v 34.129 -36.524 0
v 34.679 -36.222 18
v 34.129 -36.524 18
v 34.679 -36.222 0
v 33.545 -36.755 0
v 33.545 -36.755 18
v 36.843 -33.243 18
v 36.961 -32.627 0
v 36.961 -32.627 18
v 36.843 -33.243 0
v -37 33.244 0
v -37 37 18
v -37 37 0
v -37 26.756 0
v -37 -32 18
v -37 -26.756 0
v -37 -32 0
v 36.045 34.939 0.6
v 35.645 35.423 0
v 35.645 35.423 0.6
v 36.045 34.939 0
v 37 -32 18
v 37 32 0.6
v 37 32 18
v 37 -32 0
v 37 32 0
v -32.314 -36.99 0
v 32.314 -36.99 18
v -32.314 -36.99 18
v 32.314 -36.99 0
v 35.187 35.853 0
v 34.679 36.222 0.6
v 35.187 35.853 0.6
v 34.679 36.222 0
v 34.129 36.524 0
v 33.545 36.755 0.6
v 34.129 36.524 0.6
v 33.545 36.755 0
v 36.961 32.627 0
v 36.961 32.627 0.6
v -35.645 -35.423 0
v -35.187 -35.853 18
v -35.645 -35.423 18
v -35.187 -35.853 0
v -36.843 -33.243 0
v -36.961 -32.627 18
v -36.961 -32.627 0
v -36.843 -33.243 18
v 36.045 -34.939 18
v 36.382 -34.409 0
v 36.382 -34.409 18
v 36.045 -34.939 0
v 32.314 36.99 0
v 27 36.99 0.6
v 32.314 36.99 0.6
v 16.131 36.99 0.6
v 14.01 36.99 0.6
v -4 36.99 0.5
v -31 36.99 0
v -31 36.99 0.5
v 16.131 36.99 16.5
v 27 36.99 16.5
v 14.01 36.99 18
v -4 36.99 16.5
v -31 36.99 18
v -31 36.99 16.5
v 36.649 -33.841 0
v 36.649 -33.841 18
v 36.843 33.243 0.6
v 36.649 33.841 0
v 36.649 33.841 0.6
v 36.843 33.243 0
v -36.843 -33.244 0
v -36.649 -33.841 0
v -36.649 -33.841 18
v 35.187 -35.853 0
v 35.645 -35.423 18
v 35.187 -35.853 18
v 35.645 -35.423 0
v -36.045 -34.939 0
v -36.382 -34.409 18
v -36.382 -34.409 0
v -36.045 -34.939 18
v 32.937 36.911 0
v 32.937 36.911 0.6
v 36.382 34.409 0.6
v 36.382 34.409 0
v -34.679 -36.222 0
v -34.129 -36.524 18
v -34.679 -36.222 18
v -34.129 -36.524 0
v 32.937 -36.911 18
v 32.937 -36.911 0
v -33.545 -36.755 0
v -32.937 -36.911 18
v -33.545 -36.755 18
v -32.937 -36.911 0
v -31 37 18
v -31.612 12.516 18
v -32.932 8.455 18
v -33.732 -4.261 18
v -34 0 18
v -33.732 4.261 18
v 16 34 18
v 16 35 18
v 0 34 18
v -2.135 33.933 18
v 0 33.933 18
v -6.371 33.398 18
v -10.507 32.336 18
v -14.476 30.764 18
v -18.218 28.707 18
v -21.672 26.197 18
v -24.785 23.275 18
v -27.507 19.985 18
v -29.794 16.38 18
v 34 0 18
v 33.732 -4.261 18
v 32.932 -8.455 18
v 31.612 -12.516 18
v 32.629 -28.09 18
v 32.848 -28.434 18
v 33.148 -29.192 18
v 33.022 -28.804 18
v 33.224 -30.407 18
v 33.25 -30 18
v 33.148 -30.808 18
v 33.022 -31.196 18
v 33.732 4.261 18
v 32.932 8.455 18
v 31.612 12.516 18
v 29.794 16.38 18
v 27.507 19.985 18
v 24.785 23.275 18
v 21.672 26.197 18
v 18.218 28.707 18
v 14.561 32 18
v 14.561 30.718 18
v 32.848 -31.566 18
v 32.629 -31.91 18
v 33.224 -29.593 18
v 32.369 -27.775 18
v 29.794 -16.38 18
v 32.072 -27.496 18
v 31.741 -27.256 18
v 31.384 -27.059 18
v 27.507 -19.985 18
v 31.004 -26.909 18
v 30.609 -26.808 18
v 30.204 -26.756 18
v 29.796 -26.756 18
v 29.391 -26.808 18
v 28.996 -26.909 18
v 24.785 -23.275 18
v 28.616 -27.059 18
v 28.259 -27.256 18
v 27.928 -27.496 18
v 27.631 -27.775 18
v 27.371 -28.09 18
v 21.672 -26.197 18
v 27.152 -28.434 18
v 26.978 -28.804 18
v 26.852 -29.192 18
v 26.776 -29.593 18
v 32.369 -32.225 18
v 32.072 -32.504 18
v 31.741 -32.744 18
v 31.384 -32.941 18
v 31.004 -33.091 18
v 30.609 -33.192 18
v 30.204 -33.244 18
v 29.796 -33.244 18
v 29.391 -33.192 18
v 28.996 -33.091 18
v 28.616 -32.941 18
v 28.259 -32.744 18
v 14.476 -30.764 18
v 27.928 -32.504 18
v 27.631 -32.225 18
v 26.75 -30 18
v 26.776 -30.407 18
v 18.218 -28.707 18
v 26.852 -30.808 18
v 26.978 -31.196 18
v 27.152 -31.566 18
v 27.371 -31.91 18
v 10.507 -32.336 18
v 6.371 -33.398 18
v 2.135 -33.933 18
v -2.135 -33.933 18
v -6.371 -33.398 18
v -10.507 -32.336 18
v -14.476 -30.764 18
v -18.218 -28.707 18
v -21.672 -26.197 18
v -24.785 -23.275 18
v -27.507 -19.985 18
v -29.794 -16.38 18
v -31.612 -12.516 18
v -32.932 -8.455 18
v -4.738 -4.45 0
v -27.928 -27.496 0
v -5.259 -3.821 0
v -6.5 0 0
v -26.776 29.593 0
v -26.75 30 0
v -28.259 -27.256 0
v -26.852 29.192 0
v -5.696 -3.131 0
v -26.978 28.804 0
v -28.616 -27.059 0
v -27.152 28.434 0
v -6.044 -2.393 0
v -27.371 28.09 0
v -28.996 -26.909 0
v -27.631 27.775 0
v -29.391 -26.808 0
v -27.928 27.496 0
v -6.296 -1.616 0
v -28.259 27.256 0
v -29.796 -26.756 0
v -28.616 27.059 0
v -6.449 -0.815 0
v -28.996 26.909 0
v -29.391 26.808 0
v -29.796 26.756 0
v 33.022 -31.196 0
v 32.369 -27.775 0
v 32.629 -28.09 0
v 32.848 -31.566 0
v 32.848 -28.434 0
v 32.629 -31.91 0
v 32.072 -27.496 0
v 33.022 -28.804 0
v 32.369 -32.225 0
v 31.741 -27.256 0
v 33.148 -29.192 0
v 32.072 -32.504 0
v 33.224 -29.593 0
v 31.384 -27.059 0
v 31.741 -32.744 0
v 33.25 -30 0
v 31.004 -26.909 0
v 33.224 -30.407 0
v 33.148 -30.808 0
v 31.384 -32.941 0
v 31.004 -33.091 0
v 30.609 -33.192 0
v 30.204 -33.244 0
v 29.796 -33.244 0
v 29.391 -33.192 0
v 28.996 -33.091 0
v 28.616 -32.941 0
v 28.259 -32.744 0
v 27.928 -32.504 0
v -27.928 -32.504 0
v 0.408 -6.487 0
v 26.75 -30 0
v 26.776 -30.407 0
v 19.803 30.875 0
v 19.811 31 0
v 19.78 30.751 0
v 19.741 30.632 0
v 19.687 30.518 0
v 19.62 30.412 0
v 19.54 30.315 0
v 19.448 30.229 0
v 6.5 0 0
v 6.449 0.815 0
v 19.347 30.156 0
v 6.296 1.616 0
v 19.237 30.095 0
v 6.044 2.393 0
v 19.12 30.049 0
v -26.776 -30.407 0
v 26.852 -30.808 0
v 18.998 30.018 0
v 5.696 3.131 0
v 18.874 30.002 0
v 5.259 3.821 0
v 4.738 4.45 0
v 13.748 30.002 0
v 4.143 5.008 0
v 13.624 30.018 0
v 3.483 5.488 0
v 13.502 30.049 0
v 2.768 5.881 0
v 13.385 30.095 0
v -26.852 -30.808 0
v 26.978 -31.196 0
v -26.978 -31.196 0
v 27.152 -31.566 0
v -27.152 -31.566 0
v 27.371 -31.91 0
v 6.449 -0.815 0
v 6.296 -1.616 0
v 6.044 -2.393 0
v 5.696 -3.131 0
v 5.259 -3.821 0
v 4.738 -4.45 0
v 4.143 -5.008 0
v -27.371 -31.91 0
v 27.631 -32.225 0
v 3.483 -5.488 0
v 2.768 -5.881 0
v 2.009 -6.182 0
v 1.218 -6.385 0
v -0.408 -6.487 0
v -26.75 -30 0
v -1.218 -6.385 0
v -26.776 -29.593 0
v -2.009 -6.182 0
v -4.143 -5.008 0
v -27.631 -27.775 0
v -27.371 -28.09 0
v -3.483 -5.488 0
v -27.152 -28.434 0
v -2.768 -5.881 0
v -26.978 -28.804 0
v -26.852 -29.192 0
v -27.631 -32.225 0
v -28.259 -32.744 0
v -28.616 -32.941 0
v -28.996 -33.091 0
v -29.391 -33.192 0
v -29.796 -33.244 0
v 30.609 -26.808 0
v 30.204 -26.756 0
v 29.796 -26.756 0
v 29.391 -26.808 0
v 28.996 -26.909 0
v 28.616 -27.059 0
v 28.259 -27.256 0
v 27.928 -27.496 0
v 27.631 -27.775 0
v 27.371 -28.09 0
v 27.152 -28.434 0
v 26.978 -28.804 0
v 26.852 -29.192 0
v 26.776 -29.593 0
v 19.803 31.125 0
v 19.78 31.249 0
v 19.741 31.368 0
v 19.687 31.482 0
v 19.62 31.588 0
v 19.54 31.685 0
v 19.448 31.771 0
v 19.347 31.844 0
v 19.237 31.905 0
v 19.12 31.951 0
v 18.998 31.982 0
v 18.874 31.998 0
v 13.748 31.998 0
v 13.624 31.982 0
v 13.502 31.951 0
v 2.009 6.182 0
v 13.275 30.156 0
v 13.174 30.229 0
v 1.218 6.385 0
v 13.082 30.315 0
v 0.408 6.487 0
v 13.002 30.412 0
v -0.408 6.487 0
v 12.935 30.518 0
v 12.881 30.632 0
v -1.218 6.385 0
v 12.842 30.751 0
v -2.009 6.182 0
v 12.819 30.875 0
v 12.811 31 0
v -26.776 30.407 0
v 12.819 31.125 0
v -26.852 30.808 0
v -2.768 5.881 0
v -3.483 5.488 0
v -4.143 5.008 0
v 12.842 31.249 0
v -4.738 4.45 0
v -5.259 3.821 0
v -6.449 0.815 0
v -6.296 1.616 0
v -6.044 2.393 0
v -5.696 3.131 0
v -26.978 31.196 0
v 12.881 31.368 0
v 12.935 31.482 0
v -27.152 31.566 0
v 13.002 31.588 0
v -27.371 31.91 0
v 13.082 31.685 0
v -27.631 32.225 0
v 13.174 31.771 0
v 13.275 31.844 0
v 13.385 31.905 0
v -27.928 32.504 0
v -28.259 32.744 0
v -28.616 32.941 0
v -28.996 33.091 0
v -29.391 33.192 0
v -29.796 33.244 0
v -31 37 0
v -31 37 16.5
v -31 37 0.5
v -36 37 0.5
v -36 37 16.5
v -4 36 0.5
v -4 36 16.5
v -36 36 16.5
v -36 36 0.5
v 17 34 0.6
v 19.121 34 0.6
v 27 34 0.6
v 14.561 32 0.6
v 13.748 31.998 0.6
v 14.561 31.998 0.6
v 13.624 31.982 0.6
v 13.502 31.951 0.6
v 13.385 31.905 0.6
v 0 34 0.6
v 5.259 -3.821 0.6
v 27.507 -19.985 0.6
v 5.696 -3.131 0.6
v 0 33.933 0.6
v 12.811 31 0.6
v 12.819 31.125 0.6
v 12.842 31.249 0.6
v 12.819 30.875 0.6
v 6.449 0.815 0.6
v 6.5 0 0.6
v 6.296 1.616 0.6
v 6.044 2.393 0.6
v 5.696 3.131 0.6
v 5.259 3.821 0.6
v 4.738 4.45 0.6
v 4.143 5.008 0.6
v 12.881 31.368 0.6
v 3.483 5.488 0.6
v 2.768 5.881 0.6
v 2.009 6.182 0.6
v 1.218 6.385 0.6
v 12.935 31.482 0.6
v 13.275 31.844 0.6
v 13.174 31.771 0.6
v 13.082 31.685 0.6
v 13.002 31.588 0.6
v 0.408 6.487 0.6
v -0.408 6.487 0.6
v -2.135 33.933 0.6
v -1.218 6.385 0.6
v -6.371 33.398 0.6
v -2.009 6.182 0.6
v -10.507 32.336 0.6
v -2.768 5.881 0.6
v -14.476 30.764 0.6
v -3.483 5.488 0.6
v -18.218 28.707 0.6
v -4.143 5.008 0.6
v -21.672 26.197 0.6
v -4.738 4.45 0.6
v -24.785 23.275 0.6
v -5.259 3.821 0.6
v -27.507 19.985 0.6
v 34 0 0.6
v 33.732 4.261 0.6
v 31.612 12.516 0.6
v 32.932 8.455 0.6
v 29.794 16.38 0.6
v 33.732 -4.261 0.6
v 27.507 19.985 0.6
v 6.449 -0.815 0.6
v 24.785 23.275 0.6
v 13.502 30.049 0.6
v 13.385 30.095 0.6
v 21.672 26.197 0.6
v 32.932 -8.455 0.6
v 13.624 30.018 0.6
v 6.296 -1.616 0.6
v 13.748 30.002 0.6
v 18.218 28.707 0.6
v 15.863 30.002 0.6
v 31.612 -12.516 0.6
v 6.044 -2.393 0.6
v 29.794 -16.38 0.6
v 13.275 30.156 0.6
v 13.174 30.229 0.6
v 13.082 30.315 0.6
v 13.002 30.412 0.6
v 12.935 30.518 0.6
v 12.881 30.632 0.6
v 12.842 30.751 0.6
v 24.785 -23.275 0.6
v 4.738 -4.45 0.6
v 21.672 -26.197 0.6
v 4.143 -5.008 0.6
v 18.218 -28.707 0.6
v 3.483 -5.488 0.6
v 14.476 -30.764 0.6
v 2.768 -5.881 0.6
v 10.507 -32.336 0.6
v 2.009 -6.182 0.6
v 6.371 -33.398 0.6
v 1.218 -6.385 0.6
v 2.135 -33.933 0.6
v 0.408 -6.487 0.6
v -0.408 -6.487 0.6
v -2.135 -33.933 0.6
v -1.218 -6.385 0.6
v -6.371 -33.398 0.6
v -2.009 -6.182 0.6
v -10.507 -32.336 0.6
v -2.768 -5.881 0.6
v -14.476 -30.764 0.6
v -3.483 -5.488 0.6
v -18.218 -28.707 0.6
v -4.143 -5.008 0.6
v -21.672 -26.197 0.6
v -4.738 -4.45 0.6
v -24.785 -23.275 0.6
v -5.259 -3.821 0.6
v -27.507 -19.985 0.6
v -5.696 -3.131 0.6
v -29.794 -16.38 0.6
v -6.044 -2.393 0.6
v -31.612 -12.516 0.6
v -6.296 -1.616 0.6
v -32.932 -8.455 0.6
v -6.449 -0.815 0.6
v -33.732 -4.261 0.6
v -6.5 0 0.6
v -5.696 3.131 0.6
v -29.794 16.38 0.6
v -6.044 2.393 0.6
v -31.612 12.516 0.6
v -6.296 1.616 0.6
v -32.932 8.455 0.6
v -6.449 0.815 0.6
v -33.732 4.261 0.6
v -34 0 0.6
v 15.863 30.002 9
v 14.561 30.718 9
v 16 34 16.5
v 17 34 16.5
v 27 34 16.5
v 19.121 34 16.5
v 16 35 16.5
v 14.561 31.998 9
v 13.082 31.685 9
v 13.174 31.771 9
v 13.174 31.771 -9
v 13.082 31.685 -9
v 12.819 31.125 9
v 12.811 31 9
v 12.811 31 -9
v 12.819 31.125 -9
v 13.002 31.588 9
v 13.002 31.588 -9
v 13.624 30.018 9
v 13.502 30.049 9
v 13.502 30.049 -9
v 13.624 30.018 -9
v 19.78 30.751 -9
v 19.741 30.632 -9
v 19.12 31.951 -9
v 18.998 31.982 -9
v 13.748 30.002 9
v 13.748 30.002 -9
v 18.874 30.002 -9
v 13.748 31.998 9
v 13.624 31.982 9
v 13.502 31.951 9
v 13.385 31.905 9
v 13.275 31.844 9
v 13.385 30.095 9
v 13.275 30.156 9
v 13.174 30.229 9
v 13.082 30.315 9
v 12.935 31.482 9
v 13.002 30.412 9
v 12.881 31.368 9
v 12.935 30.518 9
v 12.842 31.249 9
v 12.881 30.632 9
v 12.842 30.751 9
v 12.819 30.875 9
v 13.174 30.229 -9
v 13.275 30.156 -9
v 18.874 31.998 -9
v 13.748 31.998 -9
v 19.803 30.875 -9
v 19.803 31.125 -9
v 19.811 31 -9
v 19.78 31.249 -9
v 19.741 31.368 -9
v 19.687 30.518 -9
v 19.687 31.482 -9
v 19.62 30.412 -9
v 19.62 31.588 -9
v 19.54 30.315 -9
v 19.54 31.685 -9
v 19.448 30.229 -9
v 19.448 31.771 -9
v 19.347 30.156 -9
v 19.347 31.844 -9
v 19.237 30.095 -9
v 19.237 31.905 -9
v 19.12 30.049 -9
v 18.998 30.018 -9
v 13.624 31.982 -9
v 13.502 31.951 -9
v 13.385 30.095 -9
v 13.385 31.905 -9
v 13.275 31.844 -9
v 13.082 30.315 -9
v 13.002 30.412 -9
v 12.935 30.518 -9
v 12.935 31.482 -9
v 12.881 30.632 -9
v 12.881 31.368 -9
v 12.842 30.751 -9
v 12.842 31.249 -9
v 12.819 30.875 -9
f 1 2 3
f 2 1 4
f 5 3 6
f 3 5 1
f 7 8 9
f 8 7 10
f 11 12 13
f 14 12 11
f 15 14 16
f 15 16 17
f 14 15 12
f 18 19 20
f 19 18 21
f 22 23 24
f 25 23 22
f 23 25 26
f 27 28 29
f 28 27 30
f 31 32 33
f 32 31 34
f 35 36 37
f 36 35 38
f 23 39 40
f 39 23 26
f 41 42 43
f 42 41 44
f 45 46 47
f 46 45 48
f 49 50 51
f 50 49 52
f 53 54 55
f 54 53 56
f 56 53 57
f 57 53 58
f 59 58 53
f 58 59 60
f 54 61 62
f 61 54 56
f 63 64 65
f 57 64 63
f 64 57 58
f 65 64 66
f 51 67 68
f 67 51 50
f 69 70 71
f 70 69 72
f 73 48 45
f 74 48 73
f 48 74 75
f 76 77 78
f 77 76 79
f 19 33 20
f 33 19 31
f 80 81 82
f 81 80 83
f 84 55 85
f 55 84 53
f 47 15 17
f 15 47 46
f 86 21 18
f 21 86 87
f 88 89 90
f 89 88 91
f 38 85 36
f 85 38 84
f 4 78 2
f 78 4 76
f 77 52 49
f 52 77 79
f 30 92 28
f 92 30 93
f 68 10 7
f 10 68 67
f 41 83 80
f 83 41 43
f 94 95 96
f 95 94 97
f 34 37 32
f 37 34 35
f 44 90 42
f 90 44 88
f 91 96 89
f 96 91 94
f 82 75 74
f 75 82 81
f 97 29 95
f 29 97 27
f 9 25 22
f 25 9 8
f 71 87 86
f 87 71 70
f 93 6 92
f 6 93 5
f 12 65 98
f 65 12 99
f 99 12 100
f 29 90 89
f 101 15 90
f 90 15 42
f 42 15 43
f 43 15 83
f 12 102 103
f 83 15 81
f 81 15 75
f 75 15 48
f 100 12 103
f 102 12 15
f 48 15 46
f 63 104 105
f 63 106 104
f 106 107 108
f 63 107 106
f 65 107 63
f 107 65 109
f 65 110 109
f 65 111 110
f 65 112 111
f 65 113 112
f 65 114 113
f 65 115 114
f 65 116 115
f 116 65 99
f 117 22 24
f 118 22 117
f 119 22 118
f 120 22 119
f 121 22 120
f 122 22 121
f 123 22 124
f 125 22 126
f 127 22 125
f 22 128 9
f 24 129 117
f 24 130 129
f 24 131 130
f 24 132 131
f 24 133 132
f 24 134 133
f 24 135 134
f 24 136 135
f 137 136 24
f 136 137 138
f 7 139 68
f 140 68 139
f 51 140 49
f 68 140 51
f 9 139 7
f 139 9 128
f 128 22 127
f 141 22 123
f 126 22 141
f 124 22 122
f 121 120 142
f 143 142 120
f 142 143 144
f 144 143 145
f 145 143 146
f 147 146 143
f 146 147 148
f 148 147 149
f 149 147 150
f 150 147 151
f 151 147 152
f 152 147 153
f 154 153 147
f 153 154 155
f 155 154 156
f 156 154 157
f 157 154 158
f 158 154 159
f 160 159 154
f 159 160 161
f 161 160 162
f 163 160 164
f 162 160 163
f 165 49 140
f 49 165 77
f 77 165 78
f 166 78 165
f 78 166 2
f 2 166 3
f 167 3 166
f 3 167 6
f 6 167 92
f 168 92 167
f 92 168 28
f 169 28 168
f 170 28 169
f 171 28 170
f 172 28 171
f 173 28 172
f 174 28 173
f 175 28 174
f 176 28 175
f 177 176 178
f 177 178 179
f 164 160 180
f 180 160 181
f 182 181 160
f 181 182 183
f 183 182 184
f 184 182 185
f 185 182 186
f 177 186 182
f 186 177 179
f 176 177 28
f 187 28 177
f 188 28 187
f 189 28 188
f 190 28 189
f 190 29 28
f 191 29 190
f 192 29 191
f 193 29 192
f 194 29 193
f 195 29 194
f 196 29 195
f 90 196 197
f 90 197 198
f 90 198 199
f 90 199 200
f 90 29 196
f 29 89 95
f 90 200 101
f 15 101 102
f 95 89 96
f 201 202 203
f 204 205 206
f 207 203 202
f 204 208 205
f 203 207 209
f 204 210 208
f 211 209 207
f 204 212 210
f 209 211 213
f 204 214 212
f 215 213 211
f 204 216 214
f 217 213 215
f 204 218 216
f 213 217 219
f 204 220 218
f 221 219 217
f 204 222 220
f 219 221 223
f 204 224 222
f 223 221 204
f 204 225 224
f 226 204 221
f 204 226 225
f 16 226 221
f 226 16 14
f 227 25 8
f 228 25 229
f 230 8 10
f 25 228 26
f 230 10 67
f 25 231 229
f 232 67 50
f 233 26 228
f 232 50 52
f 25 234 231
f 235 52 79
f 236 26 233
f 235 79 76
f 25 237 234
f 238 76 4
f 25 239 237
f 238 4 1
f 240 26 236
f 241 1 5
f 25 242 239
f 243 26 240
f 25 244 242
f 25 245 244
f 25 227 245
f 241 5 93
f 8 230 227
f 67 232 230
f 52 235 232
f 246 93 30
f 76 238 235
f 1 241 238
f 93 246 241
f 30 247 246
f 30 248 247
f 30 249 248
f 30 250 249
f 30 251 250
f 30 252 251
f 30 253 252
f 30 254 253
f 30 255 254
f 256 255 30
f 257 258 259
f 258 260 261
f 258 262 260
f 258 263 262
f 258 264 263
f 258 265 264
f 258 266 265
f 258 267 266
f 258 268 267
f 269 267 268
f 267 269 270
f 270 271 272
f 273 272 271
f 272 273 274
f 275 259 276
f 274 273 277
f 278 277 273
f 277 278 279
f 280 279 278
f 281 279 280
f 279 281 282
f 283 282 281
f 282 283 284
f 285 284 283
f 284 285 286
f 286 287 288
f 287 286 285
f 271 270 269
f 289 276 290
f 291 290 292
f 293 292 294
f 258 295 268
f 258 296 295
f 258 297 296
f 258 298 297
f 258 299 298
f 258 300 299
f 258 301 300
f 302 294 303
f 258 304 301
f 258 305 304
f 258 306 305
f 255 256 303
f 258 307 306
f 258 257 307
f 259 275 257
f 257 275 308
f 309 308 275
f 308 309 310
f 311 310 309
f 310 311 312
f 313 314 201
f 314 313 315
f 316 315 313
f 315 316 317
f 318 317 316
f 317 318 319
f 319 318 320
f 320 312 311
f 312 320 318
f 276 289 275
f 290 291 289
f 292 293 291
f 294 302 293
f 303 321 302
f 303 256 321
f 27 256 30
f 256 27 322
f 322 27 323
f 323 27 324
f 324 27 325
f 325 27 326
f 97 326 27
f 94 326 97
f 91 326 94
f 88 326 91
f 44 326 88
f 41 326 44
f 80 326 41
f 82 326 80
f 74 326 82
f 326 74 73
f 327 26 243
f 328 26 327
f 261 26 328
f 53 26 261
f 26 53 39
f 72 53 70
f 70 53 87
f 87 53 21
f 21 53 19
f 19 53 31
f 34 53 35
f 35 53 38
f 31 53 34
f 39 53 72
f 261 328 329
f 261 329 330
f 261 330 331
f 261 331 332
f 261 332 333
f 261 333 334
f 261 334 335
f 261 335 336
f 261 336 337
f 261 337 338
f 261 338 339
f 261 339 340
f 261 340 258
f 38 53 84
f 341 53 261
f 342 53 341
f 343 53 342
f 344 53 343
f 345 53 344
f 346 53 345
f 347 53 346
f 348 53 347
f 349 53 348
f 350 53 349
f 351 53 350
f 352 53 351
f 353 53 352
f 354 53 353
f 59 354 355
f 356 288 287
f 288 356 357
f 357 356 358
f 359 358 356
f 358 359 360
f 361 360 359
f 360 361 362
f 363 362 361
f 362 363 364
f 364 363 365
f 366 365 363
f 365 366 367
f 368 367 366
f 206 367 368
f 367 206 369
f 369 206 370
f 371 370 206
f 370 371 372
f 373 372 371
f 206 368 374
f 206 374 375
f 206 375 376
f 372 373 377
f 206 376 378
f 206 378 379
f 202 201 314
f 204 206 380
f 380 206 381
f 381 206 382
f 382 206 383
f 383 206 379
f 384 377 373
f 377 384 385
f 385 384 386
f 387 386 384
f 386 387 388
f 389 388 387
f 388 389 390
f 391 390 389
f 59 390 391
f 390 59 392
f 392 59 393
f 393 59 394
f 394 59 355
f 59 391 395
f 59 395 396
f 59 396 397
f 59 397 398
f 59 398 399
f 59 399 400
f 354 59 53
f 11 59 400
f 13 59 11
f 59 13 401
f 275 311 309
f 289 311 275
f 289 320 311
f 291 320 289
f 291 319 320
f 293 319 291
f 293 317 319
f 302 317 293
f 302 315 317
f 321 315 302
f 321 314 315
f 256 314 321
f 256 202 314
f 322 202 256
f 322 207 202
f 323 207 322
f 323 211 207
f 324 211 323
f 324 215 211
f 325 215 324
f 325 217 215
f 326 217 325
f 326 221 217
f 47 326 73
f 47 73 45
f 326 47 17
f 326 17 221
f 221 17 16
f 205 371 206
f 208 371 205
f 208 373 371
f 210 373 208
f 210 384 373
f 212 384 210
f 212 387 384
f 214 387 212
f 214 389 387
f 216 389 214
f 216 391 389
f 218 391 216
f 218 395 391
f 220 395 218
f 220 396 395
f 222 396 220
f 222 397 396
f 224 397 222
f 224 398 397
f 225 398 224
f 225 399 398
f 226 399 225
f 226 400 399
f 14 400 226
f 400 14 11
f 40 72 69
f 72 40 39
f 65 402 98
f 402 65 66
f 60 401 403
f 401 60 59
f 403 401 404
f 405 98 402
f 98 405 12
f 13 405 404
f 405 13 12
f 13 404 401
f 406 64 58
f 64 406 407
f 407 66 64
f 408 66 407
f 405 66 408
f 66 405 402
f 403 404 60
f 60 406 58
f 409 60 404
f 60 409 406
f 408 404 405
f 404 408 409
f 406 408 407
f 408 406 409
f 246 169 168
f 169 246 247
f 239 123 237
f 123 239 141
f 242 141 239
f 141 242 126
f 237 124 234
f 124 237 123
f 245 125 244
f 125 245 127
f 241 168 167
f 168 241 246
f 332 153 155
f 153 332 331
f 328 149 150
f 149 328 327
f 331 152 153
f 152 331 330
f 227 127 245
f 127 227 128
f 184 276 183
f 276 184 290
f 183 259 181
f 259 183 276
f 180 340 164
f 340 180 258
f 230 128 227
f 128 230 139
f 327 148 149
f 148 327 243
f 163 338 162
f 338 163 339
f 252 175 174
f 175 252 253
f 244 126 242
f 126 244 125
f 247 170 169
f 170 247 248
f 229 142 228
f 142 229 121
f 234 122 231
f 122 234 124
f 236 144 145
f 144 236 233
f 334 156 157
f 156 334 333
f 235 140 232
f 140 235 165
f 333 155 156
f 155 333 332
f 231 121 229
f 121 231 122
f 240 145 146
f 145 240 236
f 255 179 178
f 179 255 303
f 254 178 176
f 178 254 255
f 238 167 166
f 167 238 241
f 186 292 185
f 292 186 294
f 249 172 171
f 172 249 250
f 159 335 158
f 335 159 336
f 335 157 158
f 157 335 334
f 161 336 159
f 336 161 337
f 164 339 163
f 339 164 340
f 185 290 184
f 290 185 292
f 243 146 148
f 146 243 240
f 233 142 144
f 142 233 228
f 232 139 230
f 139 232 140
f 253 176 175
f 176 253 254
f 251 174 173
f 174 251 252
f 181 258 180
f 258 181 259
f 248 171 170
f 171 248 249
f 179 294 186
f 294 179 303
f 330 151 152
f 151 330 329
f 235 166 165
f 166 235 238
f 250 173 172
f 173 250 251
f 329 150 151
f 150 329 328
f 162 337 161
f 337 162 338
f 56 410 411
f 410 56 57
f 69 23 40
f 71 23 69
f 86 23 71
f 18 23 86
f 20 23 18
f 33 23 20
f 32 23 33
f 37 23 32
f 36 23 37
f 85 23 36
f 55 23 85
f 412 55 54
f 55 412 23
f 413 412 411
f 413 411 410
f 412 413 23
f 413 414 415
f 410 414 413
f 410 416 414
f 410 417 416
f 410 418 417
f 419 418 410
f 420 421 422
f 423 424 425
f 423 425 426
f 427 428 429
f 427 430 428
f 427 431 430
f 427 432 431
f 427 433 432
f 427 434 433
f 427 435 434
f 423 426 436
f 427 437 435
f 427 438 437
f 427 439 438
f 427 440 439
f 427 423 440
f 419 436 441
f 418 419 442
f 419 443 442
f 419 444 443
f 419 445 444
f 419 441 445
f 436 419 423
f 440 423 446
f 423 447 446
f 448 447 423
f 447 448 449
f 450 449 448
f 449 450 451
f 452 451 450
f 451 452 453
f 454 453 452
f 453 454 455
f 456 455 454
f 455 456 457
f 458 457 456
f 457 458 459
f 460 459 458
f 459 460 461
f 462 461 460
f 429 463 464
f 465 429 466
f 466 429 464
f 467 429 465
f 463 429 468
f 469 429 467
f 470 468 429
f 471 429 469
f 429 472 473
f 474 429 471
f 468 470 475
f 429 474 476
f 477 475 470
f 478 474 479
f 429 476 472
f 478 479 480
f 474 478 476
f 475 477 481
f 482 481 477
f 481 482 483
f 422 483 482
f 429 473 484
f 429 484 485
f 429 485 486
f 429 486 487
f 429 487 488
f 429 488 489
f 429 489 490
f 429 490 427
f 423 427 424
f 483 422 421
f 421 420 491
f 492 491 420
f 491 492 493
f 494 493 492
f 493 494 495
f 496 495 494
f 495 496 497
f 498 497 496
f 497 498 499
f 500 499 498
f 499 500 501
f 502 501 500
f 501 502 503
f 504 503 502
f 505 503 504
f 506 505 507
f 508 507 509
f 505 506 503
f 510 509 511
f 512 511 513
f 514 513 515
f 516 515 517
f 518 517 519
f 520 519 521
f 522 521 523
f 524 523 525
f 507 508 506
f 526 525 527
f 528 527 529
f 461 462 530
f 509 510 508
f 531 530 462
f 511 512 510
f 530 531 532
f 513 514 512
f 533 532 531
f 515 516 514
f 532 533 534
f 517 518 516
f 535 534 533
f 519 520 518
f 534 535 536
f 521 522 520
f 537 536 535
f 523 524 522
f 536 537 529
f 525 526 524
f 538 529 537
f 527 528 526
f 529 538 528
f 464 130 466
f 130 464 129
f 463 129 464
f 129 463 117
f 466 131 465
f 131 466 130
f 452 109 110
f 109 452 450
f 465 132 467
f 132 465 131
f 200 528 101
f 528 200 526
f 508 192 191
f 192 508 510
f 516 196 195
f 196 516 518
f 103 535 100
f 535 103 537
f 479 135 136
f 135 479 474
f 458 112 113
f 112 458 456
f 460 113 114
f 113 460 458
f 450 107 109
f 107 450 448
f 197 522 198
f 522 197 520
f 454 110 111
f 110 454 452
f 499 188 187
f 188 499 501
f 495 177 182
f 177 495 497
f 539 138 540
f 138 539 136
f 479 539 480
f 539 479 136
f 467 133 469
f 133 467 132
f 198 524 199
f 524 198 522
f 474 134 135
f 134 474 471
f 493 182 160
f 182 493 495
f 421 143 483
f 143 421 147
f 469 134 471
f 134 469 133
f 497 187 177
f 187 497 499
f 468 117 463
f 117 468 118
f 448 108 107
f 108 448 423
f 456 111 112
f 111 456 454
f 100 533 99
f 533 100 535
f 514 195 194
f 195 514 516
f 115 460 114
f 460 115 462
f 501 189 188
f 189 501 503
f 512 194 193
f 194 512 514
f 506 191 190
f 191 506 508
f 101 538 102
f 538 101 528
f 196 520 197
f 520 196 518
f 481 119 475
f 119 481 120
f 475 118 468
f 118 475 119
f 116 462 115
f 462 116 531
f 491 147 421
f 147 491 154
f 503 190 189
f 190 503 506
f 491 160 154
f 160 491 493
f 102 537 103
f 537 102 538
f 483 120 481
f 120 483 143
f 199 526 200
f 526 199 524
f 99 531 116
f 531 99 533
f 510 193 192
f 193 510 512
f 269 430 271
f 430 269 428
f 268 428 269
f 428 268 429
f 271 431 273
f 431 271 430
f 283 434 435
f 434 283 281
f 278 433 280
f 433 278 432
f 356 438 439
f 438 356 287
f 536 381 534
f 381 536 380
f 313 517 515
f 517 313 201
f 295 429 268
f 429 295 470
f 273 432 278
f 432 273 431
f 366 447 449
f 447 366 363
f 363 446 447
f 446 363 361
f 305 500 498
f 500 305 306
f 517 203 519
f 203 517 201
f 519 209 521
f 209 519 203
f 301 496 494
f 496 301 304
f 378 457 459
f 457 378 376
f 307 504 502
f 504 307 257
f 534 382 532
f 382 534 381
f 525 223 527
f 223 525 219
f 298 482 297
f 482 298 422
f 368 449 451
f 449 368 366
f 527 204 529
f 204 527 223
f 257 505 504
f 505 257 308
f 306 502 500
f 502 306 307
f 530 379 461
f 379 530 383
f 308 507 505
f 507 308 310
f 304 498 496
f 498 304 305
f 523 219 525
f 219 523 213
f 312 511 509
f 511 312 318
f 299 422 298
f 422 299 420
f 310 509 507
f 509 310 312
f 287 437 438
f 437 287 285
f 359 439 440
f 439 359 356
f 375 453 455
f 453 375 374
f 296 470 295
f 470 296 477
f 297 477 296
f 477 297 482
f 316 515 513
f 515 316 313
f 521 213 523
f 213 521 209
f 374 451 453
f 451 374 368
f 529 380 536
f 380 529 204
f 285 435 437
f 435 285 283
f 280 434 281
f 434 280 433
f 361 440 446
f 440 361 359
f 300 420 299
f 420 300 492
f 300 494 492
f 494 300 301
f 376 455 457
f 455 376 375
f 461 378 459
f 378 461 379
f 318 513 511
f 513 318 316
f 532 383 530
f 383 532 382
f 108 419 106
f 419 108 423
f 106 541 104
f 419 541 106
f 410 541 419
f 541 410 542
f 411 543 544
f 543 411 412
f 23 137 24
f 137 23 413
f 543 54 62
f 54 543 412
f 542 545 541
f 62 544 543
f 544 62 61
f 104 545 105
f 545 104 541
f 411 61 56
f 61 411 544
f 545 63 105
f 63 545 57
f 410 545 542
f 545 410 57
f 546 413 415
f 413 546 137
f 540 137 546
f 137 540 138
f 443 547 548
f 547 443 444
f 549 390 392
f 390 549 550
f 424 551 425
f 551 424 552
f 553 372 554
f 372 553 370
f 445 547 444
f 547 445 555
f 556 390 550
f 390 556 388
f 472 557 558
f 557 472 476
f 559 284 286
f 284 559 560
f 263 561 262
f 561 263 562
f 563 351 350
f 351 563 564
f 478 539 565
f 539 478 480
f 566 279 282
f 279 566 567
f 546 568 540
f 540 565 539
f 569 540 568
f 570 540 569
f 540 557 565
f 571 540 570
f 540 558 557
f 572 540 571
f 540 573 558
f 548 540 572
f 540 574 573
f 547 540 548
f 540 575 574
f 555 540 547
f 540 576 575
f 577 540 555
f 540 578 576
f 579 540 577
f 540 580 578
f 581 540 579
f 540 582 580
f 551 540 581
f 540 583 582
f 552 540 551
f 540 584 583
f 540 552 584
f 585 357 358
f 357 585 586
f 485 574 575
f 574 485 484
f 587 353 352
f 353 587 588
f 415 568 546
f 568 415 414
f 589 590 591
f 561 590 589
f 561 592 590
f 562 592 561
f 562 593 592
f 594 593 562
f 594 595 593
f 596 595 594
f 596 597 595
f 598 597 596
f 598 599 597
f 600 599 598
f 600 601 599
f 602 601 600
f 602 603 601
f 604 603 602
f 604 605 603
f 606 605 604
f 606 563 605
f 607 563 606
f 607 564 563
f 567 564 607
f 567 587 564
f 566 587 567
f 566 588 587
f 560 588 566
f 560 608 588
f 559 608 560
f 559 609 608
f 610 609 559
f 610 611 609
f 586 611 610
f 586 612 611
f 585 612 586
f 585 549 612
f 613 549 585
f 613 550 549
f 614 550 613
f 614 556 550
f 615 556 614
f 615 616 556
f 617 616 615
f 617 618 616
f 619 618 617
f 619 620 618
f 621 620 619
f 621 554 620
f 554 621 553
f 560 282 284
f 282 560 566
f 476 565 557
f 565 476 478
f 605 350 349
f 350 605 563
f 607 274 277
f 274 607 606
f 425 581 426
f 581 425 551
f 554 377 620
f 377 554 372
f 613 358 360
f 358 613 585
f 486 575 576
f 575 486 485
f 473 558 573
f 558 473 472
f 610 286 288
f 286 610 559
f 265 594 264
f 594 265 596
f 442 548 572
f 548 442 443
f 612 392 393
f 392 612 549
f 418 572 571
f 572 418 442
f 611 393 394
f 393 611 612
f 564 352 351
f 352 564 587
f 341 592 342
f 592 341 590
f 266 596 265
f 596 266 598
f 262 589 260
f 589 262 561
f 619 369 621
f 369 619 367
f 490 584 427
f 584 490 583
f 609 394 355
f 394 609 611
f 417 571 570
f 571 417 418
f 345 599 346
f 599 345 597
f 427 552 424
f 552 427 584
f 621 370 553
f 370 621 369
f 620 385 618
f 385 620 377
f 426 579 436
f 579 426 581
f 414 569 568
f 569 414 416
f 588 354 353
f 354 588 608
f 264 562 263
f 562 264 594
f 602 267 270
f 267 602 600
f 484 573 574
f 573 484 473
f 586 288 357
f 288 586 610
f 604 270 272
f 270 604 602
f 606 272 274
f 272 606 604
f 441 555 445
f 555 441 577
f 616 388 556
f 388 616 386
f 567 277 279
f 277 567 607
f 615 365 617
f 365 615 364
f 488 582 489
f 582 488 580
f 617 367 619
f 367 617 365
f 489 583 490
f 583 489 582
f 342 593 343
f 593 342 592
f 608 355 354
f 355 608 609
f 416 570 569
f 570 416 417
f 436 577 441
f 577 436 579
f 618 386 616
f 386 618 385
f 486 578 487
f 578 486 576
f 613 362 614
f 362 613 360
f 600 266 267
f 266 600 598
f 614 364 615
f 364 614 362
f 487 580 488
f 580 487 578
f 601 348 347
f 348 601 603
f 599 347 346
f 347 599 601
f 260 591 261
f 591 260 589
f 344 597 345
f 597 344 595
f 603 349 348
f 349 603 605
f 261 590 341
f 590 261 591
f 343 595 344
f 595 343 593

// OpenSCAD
$fn = 50;


union() {
	difference() {
		union() {
			hull() {
				translate(v = [-32.0000000000, 32.0000000000, 0]) {
					cylinder(h = 18, r = 5);
				}
				translate(v = [32.0000000000, 32.0000000000, 0]) {
					cylinder(h = 18, r = 5);
				}
				translate(v = [-32.0000000000, -32.0000000000, 0]) {
					cylinder(h = 18, r = 5);
				}
				translate(v = [32.0000000000, -32.0000000000, 0]) {
					cylinder(h = 18, r = 5);
				}
			}
			translate(v = [-37.0000000000, 31.0000000000, 0]) {
				cube(size = [6, 6, 18]);
			}
		}
		union() {
			translate(v = [-37.5000000000, -30.0000000000, -250.0000000000]) {
				rotate(a = [0, 0, 0]) {
					difference() {
						union() {
							hull() {
								translate(v = [7.5000000000, 0, 0]) {
									cylinder(h = 250, r = 3.2500000000, r1 = 3.2500000000, r2 = 3.2500000000);
								}
								translate(v = [-7.5000000000, 0, 0]) {
									cylinder(h = 250, r = 3.2500000000, r1 = 3.2500000000, r2 = 3.2500000000);
								}
							}
						}
						union();
					}
				}
			}
			translate(v = [-37.5000000000, 30.0000000000, -250.0000000000]) {
				rotate(a = [0, 0, 0]) {
					difference() {
						union() {
							hull() {
								translate(v = [7.5000000000, 0, 0]) {
									cylinder(h = 250, r = 3.2500000000, r1 = 3.2500000000, r2 = 3.2500000000);
								}
								translate(v = [-7.5000000000, 0, 0]) {
									cylinder(h = 250, r = 3.2500000000, r1 = 3.2500000000, r2 = 3.2500000000);
								}
							}
						}
						union();
					}
				}
			}
			translate(v = [-36.0000000000, 36.0000000000, 0.5000000000]) {
				cube(size = [32, 1, 16]);
			}
			translate(v = [30.0000000000, -30.0000000000, 0]) {
				cylinder(h = 100, r = 3.2500000000);
			}
			translate(v = [0, 0, 0.6000000000]) {
				cylinder(h = 20.4000000000, r = 34.0000000000);
			}
			translate(v = [0, 0, -9.0000000000]) {
				cylinder(h = 18, r = 6.5000000000);
			}
			translate(v = [0.0000000000, 32.0000000000, 0.6000000000]) {
				cube(size = [37.0000000000, 2, 20.4000000000]);
			}
			translate(v = [27.0000000000, 32.0000000000, 0.6000000000]) {
				cube(size = [10, 5, 20.4000000000]);
			}
			translate(v = [16.0000000000, 32.0000000000, 16.5000000000]) {
				cube(size = [21, 5, 1.5000000000]);
			}
			translate(v = [13.2500000000, 37.7500000000, 0.6000000000]) {
				rotate(a = [0, 0, -45]) {
					cube(size = [7.5000000000, 1.5000000000, 20.4000000000]);
				}
			}
			translate(v = [7.0610000000, 30.0000000000, 0.6000000000]) {
				cube(size = [7.5000000000, 2, 17.4000000000]);
			}
		}
	}
	union() {
		translate(v = [16.3110000000, 31.0000000000, -9.0000000000]) {
			rotate(a = [0, 0, 0]) {
				difference() {
					union() {
						#hull() {
							#translate(v = [2.5000000000, 0, 0]) {
								cylinder(h = 18, r = 1.0000000000, r1 = 1.0000000000, r2 = 1.0000000000);
							}
							#translate(v = [-2.5000000000, 0, 0]) {
								cylinder(h = 18, r = 1.0000000000, r1 = 1.0000000000, r2 = 1.0000000000);
							}
						}
					}
					union();
				}
			}
		}
	}
}
